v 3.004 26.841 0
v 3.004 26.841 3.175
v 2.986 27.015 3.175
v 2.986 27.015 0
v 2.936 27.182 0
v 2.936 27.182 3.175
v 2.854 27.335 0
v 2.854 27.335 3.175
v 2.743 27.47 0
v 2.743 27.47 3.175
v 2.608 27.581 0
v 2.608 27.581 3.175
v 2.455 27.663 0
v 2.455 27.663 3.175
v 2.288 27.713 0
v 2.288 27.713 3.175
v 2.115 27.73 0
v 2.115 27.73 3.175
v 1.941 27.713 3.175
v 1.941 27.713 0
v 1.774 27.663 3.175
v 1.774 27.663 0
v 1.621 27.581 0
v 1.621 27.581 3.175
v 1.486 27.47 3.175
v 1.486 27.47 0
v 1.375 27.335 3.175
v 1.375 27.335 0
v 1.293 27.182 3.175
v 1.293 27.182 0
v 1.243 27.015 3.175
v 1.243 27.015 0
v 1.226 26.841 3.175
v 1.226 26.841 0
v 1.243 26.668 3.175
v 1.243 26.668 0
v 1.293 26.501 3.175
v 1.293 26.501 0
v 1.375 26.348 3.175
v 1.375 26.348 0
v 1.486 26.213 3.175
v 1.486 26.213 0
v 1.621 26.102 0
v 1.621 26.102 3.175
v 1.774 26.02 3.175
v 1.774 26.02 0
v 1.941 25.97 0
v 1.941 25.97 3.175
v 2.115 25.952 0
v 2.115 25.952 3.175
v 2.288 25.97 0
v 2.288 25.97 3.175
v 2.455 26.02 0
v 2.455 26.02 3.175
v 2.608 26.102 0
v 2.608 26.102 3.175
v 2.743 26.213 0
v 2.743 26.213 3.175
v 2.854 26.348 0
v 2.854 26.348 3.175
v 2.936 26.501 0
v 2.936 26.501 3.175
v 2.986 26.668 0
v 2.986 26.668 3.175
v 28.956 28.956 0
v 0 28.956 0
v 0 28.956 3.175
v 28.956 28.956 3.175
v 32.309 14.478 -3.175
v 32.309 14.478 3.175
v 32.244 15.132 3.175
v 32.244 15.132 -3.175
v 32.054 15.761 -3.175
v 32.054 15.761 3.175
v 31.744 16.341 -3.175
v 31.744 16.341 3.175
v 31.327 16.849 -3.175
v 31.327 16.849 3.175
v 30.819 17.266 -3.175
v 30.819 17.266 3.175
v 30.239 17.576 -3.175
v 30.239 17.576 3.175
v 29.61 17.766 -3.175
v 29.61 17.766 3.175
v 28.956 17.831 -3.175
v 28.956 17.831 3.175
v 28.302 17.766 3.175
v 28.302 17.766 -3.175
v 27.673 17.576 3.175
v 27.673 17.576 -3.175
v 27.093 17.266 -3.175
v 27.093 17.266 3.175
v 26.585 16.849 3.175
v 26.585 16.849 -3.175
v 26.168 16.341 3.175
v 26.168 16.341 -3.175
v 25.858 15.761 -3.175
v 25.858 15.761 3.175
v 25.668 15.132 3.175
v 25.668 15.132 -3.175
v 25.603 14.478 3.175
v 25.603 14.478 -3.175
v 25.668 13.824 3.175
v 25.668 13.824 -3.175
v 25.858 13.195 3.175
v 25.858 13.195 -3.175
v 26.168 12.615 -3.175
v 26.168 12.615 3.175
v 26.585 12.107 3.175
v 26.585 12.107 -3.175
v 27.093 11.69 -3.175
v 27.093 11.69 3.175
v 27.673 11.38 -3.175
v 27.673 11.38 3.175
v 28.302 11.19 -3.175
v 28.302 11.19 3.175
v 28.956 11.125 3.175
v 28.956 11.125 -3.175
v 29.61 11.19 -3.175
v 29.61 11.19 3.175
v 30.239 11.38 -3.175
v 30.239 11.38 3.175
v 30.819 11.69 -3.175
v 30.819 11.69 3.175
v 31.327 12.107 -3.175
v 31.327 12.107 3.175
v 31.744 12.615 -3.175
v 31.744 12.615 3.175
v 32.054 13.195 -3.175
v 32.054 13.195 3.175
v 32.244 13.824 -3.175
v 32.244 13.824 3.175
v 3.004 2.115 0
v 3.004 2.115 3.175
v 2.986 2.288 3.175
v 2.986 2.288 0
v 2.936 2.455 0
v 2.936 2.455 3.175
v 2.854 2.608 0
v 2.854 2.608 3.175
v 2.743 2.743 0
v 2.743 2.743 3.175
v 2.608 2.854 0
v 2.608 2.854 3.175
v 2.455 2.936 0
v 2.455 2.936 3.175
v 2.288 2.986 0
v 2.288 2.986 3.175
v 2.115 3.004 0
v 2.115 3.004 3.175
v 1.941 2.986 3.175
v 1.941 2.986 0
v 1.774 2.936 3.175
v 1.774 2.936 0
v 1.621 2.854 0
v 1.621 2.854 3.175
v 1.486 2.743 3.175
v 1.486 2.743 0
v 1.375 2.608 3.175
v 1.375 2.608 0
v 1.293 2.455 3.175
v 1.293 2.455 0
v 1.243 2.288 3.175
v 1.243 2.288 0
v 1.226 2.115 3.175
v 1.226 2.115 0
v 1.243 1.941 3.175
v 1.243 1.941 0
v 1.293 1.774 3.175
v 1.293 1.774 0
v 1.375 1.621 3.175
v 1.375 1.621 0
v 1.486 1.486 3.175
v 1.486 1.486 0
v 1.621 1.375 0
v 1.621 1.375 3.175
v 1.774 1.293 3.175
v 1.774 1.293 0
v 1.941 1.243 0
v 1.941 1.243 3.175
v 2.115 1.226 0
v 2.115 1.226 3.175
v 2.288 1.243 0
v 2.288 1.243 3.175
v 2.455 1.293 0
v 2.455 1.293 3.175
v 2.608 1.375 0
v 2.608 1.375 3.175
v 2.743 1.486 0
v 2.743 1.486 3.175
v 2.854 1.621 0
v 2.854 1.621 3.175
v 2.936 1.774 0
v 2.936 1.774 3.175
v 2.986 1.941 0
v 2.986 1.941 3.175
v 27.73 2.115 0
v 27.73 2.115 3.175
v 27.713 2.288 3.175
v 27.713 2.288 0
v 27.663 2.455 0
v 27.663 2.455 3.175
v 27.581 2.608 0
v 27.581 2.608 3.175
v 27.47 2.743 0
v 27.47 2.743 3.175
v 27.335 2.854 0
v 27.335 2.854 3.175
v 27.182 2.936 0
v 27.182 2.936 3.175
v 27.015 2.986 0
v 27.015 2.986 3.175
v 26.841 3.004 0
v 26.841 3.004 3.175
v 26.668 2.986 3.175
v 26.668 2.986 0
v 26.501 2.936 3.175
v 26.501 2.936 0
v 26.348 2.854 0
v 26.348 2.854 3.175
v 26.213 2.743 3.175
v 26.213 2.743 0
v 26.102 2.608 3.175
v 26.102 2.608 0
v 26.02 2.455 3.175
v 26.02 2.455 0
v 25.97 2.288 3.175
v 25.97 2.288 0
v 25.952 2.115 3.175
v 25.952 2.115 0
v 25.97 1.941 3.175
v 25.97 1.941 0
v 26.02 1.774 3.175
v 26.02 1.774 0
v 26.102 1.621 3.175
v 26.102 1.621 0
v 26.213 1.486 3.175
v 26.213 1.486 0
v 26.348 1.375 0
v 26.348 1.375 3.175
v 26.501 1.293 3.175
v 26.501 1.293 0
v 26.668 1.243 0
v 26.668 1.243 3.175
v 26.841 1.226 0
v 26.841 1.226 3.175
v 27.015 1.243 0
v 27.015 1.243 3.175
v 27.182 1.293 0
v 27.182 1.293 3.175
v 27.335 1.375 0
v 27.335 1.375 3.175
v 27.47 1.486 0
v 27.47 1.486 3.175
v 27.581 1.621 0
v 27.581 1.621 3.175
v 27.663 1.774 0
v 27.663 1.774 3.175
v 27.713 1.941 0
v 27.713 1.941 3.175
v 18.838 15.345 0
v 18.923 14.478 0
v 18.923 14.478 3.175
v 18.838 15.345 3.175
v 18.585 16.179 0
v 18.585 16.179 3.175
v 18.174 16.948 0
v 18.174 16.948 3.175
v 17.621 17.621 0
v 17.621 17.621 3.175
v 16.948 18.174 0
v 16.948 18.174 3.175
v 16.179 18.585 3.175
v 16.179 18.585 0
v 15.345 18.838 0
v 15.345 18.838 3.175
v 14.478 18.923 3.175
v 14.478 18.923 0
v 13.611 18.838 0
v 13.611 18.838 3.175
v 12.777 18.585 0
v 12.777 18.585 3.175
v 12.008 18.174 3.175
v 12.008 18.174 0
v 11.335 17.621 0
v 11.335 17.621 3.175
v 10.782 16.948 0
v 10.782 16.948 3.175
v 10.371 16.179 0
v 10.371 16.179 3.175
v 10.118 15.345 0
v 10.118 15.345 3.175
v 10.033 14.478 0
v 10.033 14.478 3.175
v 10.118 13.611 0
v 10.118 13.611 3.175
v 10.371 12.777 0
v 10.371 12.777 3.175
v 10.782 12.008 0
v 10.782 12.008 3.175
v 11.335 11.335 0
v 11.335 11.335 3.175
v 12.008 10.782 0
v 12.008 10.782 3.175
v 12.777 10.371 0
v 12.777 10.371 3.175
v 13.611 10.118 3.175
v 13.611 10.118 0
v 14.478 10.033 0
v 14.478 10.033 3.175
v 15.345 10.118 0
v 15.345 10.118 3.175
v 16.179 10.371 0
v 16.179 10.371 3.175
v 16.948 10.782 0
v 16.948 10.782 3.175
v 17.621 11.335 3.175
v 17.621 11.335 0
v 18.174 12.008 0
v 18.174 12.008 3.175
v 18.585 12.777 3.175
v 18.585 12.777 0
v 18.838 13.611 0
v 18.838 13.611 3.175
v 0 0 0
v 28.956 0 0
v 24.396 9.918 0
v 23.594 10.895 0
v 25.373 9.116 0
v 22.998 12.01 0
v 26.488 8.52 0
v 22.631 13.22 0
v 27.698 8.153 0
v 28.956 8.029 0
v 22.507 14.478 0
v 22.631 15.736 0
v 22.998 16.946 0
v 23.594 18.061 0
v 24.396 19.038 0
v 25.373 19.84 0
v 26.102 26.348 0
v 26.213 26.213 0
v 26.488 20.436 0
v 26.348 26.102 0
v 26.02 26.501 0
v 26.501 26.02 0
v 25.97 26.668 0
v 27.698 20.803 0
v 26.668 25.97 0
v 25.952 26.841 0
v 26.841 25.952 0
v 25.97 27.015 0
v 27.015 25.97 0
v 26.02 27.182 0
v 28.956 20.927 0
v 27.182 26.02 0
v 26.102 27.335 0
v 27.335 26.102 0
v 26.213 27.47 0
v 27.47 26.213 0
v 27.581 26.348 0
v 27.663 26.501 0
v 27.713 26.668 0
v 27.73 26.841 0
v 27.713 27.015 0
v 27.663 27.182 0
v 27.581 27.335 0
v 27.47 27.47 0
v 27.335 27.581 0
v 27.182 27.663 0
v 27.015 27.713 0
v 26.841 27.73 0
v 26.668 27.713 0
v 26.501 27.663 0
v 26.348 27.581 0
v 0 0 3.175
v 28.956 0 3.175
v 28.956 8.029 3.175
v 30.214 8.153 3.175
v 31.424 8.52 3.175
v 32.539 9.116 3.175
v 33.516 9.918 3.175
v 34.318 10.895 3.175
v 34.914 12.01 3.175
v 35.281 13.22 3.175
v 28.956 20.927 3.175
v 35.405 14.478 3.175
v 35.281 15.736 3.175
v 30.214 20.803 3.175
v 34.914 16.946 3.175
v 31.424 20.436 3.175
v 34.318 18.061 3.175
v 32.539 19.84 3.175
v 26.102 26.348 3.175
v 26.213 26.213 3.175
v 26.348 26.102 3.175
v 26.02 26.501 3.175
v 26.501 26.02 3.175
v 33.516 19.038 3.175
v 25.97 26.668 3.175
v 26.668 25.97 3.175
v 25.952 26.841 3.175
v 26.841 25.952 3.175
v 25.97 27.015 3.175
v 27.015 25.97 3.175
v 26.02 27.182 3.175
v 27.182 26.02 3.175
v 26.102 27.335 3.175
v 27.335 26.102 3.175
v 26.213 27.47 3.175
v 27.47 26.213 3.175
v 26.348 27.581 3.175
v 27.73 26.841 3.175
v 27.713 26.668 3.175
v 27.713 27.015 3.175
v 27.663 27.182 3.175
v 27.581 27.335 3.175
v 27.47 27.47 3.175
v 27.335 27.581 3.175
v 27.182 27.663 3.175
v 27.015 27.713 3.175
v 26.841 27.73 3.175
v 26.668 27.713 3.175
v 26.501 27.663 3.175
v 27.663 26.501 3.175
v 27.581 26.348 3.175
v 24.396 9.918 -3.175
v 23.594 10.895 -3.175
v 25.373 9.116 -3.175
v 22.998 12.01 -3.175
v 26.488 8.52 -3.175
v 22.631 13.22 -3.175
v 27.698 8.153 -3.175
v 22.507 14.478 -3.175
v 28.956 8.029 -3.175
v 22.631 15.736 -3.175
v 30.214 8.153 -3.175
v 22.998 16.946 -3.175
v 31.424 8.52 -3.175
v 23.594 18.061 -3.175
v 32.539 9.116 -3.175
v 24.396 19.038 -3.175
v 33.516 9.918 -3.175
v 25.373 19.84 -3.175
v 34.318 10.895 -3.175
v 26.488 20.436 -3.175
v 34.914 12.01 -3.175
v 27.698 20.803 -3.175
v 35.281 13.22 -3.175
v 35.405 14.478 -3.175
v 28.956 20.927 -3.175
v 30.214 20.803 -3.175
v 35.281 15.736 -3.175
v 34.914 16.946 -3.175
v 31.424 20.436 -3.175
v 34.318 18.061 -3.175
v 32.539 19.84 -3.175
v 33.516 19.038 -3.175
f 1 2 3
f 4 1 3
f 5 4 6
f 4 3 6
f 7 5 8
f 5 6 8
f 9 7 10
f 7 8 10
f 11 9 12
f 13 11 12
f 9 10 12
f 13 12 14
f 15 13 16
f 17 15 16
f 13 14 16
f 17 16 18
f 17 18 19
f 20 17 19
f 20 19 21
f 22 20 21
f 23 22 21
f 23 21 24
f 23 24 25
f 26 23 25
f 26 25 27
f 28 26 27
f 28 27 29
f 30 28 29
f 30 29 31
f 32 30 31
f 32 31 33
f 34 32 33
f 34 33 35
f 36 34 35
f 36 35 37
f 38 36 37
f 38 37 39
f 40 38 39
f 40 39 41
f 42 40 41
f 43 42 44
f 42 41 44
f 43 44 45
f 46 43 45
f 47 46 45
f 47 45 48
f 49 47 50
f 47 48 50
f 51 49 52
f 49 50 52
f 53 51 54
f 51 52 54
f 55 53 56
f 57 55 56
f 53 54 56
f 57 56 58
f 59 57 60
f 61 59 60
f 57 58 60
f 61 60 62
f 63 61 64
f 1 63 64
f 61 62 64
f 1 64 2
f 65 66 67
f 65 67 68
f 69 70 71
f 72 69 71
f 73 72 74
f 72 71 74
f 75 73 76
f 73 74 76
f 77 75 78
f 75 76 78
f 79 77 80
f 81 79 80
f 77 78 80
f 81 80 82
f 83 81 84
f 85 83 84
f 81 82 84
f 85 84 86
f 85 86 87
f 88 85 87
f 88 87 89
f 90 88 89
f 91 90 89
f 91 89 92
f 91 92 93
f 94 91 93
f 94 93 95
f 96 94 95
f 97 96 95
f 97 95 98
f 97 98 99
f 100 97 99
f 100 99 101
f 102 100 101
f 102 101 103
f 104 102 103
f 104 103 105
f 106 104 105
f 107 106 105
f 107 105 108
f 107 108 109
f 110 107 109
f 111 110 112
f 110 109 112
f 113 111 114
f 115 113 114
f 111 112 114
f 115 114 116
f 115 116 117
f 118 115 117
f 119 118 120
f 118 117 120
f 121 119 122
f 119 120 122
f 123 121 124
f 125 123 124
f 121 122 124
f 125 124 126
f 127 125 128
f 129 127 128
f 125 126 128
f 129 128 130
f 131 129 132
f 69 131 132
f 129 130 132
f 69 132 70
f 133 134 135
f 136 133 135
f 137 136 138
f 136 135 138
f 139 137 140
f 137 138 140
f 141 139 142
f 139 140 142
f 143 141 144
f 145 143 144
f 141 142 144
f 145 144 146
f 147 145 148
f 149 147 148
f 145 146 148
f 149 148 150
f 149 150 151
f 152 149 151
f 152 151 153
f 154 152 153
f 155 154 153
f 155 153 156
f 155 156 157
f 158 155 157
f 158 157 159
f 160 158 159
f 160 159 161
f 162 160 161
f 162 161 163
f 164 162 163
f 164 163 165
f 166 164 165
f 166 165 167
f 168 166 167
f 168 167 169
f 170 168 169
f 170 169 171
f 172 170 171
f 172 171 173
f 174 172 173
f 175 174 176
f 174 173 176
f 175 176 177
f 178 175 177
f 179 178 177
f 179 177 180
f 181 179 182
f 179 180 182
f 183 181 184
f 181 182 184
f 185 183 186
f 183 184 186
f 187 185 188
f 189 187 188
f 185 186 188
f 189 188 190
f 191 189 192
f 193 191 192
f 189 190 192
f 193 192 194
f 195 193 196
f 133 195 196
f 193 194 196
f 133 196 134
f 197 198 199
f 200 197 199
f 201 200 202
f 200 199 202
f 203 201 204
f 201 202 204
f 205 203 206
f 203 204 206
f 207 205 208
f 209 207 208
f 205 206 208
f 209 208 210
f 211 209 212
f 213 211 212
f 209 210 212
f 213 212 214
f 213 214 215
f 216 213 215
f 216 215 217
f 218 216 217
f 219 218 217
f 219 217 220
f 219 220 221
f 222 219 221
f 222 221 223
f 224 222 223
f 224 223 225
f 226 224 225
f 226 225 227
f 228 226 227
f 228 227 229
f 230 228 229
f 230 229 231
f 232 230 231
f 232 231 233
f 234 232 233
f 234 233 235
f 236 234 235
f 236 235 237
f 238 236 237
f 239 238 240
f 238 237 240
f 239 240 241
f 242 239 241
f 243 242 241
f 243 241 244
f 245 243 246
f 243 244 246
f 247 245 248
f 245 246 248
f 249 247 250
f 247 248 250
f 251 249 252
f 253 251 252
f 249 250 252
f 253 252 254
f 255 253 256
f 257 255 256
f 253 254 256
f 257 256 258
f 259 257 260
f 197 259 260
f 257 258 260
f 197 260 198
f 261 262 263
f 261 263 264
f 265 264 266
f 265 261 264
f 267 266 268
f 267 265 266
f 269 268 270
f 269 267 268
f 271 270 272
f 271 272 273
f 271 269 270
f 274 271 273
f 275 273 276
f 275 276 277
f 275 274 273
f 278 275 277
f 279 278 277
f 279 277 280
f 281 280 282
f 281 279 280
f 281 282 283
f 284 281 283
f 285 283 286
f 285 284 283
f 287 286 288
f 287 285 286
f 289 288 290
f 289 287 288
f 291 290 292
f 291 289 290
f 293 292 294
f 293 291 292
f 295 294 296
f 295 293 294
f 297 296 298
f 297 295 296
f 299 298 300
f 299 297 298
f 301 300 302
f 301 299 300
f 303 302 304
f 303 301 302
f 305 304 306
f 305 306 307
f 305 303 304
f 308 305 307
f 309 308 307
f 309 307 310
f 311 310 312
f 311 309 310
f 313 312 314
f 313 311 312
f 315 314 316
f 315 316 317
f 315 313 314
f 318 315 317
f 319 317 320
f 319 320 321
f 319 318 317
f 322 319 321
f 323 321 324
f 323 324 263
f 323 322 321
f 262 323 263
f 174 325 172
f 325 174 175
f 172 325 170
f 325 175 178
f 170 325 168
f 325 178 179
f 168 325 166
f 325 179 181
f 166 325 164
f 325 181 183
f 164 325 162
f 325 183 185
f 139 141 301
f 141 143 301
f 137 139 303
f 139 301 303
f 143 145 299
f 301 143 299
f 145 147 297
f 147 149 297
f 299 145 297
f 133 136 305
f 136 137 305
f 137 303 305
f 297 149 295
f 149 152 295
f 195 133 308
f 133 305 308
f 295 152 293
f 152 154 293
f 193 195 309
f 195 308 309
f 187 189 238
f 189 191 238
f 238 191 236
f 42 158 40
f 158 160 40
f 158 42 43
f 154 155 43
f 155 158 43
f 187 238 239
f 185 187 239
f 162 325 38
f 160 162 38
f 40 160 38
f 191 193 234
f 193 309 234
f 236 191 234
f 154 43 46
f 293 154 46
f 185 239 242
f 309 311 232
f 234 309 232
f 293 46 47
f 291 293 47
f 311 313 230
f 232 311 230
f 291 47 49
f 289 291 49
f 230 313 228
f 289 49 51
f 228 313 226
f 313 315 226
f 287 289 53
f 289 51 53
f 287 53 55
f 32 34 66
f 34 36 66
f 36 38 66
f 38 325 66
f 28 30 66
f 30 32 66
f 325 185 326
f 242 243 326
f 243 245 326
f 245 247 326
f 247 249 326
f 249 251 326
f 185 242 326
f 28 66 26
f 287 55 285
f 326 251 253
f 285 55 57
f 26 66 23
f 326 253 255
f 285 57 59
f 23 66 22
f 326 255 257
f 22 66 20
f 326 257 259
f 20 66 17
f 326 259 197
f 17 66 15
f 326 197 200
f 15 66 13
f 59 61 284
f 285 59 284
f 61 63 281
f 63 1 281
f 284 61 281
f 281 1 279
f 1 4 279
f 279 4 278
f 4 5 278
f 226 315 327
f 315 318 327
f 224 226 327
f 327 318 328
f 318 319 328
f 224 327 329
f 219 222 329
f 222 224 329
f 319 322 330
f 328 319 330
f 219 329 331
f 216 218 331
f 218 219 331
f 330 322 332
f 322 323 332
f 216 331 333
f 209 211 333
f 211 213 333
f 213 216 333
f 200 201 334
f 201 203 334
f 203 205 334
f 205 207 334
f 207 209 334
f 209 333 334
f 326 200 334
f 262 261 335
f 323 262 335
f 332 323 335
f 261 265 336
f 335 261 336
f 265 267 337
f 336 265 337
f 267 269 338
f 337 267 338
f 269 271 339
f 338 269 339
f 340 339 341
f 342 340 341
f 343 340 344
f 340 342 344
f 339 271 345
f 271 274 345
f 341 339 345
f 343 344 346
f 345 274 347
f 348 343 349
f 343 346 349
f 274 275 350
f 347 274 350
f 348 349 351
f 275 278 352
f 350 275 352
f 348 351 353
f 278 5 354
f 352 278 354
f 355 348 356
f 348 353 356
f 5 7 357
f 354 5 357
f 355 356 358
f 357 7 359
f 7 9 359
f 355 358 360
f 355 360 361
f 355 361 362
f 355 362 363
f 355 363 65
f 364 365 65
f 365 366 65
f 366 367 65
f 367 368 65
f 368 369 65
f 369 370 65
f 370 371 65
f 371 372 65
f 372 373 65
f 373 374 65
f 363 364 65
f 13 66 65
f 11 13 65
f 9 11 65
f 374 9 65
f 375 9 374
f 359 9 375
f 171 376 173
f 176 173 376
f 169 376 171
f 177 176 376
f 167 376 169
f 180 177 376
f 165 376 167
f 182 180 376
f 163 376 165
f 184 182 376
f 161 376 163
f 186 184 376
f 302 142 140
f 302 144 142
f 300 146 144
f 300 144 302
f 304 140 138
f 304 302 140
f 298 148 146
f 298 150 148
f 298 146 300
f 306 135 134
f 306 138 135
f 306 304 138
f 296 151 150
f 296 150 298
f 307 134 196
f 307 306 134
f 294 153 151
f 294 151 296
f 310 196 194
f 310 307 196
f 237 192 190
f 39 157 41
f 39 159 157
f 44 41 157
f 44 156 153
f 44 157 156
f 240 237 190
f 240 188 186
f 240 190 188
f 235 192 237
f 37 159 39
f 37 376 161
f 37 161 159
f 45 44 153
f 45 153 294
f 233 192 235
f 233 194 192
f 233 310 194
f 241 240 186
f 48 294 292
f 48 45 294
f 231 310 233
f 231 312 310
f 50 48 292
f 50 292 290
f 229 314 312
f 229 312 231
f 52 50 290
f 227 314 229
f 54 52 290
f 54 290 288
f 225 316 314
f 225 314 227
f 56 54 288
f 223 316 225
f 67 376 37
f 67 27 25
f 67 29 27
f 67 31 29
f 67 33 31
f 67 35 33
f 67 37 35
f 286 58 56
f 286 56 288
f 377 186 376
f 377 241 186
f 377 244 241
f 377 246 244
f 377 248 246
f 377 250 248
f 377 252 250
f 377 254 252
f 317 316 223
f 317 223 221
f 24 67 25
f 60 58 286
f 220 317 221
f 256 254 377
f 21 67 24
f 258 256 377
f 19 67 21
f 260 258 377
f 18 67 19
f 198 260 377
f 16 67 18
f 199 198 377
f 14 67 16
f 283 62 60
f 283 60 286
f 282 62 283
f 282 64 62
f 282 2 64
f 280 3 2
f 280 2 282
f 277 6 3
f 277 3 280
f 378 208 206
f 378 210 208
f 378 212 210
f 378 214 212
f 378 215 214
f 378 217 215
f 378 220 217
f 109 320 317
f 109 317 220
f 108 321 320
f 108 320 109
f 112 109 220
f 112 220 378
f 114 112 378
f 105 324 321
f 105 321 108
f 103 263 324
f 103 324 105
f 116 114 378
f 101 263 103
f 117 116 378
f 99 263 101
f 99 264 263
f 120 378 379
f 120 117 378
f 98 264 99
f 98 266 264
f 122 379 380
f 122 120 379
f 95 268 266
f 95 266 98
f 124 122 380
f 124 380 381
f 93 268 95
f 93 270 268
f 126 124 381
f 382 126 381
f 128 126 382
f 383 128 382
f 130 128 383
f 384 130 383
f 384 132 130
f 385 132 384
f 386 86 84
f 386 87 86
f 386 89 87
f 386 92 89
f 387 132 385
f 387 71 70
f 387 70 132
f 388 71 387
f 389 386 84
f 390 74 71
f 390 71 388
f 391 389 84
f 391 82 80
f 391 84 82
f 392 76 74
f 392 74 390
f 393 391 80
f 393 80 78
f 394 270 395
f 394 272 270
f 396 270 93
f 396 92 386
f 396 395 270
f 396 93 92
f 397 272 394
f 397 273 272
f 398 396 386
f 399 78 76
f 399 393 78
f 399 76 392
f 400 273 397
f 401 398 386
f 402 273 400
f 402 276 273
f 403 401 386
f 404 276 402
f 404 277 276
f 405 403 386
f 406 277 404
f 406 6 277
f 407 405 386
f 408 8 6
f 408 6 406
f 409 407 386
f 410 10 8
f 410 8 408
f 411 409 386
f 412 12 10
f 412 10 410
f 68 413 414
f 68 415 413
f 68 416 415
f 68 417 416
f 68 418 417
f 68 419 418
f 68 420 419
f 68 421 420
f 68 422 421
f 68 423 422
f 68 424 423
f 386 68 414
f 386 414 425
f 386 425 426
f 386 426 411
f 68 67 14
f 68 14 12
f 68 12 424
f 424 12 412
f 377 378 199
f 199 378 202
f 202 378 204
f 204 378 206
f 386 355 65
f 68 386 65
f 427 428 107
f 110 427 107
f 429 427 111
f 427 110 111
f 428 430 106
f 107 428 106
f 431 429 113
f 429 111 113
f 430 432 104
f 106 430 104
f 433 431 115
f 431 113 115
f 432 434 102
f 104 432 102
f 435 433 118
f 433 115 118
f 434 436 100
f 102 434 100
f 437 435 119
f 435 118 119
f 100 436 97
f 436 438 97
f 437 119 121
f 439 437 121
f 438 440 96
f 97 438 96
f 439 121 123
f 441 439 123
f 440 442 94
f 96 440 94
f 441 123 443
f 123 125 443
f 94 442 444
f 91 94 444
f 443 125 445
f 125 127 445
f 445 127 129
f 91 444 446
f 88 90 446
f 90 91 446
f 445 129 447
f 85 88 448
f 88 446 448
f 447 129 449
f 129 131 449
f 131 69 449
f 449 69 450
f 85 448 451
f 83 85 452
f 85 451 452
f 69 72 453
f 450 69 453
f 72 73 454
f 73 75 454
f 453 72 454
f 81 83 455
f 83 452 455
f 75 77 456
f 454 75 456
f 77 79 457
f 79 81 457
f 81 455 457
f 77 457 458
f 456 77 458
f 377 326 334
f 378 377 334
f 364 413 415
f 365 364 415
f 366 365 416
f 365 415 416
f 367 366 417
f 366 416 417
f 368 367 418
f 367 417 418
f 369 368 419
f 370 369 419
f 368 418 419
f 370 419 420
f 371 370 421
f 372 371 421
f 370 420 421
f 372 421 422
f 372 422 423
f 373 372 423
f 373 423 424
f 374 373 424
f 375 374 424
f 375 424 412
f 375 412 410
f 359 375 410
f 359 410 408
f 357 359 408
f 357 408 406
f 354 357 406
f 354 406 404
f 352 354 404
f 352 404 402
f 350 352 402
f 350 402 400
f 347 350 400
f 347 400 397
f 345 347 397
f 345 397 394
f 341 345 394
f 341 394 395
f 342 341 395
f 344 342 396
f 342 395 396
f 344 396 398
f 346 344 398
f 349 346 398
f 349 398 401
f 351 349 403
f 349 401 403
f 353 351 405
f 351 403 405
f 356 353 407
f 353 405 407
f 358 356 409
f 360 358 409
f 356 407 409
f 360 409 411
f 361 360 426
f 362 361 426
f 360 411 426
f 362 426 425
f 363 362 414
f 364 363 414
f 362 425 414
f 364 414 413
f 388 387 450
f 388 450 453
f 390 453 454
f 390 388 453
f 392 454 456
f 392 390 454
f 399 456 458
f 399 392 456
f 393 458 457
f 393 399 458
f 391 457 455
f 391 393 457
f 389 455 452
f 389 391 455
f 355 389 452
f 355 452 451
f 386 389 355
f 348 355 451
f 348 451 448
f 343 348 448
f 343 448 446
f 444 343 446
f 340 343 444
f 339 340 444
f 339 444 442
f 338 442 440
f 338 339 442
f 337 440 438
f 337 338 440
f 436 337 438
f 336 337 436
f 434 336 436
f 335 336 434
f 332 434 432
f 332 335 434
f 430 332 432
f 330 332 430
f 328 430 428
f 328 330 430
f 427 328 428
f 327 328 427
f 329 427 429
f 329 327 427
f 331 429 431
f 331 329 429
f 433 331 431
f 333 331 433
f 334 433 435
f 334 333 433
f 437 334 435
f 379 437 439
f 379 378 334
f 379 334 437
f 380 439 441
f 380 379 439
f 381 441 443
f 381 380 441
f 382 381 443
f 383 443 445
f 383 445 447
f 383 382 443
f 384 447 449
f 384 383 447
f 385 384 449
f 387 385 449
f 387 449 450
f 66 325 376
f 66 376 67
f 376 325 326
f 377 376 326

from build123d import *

# Parameters (mm, degrees)
SKETCH1_W           = 28.956
SKETCH1_H           = 28.956
SKETCH1_R           = 4.445
BOSS_EXTRUDE1_DEPTH = 3.175
SKETCH2_R           = 0.889
CUT_EXTRUDE1_DEPTH  = 4.175
SKETCH3_R           = 6.44921875
BOSS_EXTRUDE2_DEPTH = 6.35
SKETCH4_R           = 3.3528
CUT_EXTRUDE2_DEPTH  = 7.35


with BuildPart() as part:
    # Sketch1 → Boss-Extrude1 (new body)
    with BuildSketch(Plane.XY):
        with Locations((14.478, 14.478)):
            Rectangle(SKETCH1_W, SKETCH1_H)
        with Locations((14.478, 14.478)):
            Circle(SKETCH1_R, mode=Mode.SUBTRACT)
    extrude(amount=BOSS_EXTRUDE1_DEPTH)

    # Sketch2 → Cut-Extrude1 (cut, through all)
    with BuildSketch(Plane.XY.offset(3.175)):
        with Locations((2.11455, 2.11455)):
            Circle(SKETCH2_R)
        with Locations((26.84145, 2.11455)):
            Circle(SKETCH2_R)
        with Locations((26.84145, 26.84145)):
            Circle(SKETCH2_R)
        with Locations((2.11455, 26.84145)):
            Circle(SKETCH2_R)
    extrude(amount=-CUT_EXTRUDE1_DEPTH, mode=Mode.SUBTRACT)

    # Sketch3 → Boss-Extrude2 (add)
    with BuildSketch(Plane.XY.offset(3.175)):
        with Locations((28.956, 14.478)):
            Circle(SKETCH3_R)
    extrude(amount=-BOSS_EXTRUDE2_DEPTH)

    # Sketch4 → Cut-Extrude2 (cut, through all)
    with BuildSketch(Plane.XY.offset(3.175)):
        with Locations((28.956, 14.478)):
            Circle(SKETCH4_R)
    extrude(amount=-CUT_EXTRUDE2_DEPTH, mode=Mode.SUBTRACT)


solid = part.part
